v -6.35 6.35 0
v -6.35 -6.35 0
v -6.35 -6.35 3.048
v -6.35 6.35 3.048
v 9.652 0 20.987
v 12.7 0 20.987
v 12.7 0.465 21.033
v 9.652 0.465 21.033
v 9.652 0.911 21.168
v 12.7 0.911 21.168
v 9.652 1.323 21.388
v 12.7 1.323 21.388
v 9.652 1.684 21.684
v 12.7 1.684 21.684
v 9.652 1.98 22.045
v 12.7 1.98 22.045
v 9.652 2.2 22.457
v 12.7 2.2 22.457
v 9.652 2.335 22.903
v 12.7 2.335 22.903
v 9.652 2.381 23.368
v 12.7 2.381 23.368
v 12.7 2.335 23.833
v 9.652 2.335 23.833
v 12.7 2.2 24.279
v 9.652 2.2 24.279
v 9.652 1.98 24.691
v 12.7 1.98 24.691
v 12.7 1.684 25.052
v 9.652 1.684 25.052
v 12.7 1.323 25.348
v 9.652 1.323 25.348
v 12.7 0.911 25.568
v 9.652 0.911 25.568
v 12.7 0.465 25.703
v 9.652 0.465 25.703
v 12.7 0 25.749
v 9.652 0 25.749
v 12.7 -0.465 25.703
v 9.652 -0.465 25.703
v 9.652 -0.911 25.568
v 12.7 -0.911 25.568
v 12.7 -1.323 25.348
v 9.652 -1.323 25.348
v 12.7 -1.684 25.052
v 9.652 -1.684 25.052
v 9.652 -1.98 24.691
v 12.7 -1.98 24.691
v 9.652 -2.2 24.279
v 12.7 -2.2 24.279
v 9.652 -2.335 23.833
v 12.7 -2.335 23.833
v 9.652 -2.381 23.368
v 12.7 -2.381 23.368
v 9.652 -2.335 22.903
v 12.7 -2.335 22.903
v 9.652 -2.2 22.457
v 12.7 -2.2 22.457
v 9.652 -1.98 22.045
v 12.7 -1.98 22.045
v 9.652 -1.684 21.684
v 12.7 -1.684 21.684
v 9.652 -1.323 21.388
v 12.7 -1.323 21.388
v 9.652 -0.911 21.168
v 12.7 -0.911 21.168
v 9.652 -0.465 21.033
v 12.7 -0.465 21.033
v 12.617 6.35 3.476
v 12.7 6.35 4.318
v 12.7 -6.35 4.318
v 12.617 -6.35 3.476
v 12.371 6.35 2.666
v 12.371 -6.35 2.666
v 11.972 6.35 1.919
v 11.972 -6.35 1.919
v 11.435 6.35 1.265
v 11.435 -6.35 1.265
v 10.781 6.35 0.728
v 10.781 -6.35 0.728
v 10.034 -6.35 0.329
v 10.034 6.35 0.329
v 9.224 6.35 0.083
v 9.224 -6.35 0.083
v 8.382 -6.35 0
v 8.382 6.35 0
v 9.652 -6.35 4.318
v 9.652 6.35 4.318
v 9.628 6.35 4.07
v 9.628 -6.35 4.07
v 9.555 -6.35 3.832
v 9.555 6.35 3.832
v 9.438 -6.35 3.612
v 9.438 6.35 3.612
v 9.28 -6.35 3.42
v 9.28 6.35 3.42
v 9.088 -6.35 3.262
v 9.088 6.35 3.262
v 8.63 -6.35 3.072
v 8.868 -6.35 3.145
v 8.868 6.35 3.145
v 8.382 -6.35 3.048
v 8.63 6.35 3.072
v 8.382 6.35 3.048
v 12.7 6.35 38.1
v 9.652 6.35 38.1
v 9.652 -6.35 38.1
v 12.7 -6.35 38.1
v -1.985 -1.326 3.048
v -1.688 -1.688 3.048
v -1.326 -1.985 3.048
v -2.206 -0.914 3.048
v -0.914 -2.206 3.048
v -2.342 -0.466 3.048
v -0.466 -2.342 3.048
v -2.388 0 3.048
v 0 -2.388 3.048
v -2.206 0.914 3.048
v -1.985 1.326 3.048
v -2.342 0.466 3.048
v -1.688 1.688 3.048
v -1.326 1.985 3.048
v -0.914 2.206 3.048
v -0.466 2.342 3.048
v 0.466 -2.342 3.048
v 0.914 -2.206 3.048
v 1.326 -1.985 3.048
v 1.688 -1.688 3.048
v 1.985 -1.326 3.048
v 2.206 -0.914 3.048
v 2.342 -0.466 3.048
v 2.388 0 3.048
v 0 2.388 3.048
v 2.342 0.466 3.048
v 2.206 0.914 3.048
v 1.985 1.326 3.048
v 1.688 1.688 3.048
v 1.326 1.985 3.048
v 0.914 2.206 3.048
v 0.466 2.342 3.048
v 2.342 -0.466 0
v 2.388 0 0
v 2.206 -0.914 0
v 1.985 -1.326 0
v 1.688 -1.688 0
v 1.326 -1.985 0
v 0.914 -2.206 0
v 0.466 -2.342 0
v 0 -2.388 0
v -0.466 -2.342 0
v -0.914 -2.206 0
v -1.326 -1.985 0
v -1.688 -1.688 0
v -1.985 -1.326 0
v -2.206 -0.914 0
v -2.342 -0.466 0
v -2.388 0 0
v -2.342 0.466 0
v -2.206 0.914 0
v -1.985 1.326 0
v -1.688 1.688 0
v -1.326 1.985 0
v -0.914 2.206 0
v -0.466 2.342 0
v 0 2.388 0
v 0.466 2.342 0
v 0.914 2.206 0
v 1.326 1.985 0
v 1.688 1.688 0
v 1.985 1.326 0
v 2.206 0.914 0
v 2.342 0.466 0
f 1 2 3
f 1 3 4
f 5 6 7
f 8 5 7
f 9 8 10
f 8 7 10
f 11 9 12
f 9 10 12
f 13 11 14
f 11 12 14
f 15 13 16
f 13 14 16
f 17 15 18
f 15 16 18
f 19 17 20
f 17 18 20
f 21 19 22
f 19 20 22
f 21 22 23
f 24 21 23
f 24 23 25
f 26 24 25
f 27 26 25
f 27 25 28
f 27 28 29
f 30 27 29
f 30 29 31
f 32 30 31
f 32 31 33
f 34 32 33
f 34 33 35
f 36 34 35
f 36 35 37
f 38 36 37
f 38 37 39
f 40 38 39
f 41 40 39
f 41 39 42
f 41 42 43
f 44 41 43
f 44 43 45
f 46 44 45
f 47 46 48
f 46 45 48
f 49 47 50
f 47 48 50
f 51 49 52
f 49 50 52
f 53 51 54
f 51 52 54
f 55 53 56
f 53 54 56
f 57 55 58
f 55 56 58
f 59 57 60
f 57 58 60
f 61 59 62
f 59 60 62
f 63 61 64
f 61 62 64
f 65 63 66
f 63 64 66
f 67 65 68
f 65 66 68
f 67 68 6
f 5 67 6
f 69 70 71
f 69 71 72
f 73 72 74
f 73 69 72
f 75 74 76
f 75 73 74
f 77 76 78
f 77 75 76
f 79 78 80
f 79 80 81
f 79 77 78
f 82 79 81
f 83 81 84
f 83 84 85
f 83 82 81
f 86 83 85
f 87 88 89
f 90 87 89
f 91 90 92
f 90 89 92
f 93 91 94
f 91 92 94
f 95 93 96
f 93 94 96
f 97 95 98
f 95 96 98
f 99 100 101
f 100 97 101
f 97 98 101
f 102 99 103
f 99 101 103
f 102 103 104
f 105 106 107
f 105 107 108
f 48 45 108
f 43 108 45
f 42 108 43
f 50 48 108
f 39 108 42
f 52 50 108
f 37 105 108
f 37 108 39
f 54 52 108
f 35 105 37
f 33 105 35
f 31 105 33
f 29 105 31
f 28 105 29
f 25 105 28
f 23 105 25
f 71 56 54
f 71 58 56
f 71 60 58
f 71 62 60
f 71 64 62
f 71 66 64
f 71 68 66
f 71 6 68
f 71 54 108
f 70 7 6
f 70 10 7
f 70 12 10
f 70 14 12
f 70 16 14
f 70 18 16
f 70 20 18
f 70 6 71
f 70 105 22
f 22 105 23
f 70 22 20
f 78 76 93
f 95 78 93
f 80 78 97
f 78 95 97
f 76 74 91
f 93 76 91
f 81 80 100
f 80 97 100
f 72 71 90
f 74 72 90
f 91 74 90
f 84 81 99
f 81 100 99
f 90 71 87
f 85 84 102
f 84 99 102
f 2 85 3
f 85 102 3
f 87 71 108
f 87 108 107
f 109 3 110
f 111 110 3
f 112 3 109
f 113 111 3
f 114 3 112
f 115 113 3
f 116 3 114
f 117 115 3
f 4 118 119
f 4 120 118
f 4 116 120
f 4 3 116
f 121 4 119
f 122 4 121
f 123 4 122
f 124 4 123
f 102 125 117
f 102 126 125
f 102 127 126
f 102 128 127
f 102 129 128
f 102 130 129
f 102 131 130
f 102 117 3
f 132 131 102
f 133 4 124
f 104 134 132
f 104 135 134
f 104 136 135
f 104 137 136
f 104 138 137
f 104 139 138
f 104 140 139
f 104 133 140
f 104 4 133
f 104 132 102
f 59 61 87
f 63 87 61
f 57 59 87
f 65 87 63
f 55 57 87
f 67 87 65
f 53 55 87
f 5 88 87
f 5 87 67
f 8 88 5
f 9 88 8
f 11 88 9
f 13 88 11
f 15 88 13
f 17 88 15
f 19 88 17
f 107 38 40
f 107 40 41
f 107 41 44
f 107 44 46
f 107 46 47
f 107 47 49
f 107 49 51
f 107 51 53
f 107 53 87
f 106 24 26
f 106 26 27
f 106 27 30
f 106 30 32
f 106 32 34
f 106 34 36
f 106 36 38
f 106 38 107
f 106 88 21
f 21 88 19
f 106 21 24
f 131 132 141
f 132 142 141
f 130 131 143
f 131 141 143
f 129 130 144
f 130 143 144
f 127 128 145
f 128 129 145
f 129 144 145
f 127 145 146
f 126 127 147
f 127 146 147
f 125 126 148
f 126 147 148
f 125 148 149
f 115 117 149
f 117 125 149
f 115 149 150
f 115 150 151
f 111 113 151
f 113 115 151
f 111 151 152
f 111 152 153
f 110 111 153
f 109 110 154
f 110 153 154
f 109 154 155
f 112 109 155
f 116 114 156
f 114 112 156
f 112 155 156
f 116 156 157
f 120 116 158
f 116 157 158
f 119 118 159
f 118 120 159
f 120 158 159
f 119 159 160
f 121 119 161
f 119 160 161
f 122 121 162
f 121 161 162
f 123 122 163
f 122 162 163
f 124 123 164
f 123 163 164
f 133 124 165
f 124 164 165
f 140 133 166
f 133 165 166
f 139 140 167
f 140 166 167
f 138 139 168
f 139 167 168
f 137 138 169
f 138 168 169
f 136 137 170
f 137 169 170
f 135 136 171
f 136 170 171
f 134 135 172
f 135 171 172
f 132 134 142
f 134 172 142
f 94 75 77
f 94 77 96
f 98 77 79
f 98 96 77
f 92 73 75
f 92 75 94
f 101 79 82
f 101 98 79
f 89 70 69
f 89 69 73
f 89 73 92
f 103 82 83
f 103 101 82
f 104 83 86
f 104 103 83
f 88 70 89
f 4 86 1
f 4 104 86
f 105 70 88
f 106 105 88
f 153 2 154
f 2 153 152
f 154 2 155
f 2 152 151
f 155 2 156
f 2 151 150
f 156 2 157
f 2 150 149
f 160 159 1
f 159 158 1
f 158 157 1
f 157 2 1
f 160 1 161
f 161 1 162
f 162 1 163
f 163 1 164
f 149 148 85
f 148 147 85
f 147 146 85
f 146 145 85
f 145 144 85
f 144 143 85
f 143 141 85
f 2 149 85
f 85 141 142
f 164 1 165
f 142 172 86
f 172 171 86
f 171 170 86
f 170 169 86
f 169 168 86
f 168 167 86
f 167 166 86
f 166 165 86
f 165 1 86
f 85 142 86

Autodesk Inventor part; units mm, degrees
ref_plane "YZ Plane" through (0, 0, 0) normal (1, 0, 0) x (0, 1, 0)
ref_plane "XZ Plane" through (0, 0, 0) normal (0, 1, 0) x (-1, 0, 0)
ref_plane "XY Plane" through (0, 0, 0) normal (0, 0, 1) x (1, 0, 0)
sketch "Sketch1" plane through (0, 0, 0) normal (0, 0, 1) x (1, 0, 0)
  circle A0 centre (0, 0) radius 2.3876
  line L0 (12.7, 0) -> (12.7, 6.35)
  line L1 (12.7, -6.35) -> (12.7, 0)
  line L2 (-6.35, -6.35) -> (-6.35, 6.35)
  line L3 (-6.35, 6.35) -> (12.7, 6.35)
  line L4 (-6.35, -6.35) -> (12.7, -6.35)
  dimension "d0" = 4.7752
  dimension "d1" = 6.35
  dimension "d4" = 12.7
  dimension "d22" = 19.05
  dimension "d23" = 12.7
extrude "Plate1" add sketch "Sketch1" along normal blind 3.048
sketch "Sketch2" plane through (9.652, 6.35, 0) normal (1, 0, 0) x (0, 1, 0)
  line L0 (-12.7, 0) -> (0, 0)
  line L1 (0, 0) -> (0, 38.1)
  line L2 (0, 38.1) -> (-12.7, 38.1)
  line L3 (-12.7, 38.1) -> (-12.7, 0)
edge flange "Flange1" height 38.1 angle 90 thickness 3.048 bend radius 1.27 thickness toward (1, 0, 0) relief tear relief width 3.048 relief depth 1.524 edges at (12.7, 3.175, 3.048) wall of the first edge with corners at (9.652, -6.35, 0) (9.652, 6.35, 0) (9.652, 6.35, 38.1) (9.652, -6.35, 38.1)
bend "Bend1"
corner "Corner1"
sketch "Sketch3" plane through (12.7, -6.35, 38.1) normal (1, 0, 0) x (0, 0, -1)
  circle A0 centre (14.732, 6.35) radius 2.3812
  line L0 (33.782, 0) -> (33.782, 12.7) projected
  line L1 (33.782, 0) -> (0, 0) projected
  point P0 (38.1, 6.35)
  dimension "d17" = 4.7625
  dimension "d20" = 6.35
  dimension "d21" = 19.05
extrude "Extrusion1" cut sketch "Sketch3" against normal blind 25.4
equation "\"d7\" = BendReliefWidth"
equation "\"d8\" = BendReliefDepth"
equation "\"d9\" = MinimumRemnant"
equation "\"d10\" = BendRadius"
equation "\"d14\" = CornerReliefSize"
equation "\"d15\" = GapSize"
equation "\"d16\" = JacobiRadiusSize"
equation "\"BendRadius\" = Thickness"
equation "\"BendReliefWidth\" = Thickness"
equation "\"BendReliefDepth\" = 0.5 * Thickness"
equation "\"CornerReliefSize\" = 4 * Thickness"
equation "\"MinimumRemnant\" = 2 * Thickness"
equation "\"TransitionRadius\" = BendRadius"
equation "\"JacobiRadiusSize\" = BendRadius"
equation "\"GapSize\" = Thickness"
equation "\"d6\" = BendRadius"
equation "\"Thickness\" = 3.048"
properties part number "PistonFrontHinge"
